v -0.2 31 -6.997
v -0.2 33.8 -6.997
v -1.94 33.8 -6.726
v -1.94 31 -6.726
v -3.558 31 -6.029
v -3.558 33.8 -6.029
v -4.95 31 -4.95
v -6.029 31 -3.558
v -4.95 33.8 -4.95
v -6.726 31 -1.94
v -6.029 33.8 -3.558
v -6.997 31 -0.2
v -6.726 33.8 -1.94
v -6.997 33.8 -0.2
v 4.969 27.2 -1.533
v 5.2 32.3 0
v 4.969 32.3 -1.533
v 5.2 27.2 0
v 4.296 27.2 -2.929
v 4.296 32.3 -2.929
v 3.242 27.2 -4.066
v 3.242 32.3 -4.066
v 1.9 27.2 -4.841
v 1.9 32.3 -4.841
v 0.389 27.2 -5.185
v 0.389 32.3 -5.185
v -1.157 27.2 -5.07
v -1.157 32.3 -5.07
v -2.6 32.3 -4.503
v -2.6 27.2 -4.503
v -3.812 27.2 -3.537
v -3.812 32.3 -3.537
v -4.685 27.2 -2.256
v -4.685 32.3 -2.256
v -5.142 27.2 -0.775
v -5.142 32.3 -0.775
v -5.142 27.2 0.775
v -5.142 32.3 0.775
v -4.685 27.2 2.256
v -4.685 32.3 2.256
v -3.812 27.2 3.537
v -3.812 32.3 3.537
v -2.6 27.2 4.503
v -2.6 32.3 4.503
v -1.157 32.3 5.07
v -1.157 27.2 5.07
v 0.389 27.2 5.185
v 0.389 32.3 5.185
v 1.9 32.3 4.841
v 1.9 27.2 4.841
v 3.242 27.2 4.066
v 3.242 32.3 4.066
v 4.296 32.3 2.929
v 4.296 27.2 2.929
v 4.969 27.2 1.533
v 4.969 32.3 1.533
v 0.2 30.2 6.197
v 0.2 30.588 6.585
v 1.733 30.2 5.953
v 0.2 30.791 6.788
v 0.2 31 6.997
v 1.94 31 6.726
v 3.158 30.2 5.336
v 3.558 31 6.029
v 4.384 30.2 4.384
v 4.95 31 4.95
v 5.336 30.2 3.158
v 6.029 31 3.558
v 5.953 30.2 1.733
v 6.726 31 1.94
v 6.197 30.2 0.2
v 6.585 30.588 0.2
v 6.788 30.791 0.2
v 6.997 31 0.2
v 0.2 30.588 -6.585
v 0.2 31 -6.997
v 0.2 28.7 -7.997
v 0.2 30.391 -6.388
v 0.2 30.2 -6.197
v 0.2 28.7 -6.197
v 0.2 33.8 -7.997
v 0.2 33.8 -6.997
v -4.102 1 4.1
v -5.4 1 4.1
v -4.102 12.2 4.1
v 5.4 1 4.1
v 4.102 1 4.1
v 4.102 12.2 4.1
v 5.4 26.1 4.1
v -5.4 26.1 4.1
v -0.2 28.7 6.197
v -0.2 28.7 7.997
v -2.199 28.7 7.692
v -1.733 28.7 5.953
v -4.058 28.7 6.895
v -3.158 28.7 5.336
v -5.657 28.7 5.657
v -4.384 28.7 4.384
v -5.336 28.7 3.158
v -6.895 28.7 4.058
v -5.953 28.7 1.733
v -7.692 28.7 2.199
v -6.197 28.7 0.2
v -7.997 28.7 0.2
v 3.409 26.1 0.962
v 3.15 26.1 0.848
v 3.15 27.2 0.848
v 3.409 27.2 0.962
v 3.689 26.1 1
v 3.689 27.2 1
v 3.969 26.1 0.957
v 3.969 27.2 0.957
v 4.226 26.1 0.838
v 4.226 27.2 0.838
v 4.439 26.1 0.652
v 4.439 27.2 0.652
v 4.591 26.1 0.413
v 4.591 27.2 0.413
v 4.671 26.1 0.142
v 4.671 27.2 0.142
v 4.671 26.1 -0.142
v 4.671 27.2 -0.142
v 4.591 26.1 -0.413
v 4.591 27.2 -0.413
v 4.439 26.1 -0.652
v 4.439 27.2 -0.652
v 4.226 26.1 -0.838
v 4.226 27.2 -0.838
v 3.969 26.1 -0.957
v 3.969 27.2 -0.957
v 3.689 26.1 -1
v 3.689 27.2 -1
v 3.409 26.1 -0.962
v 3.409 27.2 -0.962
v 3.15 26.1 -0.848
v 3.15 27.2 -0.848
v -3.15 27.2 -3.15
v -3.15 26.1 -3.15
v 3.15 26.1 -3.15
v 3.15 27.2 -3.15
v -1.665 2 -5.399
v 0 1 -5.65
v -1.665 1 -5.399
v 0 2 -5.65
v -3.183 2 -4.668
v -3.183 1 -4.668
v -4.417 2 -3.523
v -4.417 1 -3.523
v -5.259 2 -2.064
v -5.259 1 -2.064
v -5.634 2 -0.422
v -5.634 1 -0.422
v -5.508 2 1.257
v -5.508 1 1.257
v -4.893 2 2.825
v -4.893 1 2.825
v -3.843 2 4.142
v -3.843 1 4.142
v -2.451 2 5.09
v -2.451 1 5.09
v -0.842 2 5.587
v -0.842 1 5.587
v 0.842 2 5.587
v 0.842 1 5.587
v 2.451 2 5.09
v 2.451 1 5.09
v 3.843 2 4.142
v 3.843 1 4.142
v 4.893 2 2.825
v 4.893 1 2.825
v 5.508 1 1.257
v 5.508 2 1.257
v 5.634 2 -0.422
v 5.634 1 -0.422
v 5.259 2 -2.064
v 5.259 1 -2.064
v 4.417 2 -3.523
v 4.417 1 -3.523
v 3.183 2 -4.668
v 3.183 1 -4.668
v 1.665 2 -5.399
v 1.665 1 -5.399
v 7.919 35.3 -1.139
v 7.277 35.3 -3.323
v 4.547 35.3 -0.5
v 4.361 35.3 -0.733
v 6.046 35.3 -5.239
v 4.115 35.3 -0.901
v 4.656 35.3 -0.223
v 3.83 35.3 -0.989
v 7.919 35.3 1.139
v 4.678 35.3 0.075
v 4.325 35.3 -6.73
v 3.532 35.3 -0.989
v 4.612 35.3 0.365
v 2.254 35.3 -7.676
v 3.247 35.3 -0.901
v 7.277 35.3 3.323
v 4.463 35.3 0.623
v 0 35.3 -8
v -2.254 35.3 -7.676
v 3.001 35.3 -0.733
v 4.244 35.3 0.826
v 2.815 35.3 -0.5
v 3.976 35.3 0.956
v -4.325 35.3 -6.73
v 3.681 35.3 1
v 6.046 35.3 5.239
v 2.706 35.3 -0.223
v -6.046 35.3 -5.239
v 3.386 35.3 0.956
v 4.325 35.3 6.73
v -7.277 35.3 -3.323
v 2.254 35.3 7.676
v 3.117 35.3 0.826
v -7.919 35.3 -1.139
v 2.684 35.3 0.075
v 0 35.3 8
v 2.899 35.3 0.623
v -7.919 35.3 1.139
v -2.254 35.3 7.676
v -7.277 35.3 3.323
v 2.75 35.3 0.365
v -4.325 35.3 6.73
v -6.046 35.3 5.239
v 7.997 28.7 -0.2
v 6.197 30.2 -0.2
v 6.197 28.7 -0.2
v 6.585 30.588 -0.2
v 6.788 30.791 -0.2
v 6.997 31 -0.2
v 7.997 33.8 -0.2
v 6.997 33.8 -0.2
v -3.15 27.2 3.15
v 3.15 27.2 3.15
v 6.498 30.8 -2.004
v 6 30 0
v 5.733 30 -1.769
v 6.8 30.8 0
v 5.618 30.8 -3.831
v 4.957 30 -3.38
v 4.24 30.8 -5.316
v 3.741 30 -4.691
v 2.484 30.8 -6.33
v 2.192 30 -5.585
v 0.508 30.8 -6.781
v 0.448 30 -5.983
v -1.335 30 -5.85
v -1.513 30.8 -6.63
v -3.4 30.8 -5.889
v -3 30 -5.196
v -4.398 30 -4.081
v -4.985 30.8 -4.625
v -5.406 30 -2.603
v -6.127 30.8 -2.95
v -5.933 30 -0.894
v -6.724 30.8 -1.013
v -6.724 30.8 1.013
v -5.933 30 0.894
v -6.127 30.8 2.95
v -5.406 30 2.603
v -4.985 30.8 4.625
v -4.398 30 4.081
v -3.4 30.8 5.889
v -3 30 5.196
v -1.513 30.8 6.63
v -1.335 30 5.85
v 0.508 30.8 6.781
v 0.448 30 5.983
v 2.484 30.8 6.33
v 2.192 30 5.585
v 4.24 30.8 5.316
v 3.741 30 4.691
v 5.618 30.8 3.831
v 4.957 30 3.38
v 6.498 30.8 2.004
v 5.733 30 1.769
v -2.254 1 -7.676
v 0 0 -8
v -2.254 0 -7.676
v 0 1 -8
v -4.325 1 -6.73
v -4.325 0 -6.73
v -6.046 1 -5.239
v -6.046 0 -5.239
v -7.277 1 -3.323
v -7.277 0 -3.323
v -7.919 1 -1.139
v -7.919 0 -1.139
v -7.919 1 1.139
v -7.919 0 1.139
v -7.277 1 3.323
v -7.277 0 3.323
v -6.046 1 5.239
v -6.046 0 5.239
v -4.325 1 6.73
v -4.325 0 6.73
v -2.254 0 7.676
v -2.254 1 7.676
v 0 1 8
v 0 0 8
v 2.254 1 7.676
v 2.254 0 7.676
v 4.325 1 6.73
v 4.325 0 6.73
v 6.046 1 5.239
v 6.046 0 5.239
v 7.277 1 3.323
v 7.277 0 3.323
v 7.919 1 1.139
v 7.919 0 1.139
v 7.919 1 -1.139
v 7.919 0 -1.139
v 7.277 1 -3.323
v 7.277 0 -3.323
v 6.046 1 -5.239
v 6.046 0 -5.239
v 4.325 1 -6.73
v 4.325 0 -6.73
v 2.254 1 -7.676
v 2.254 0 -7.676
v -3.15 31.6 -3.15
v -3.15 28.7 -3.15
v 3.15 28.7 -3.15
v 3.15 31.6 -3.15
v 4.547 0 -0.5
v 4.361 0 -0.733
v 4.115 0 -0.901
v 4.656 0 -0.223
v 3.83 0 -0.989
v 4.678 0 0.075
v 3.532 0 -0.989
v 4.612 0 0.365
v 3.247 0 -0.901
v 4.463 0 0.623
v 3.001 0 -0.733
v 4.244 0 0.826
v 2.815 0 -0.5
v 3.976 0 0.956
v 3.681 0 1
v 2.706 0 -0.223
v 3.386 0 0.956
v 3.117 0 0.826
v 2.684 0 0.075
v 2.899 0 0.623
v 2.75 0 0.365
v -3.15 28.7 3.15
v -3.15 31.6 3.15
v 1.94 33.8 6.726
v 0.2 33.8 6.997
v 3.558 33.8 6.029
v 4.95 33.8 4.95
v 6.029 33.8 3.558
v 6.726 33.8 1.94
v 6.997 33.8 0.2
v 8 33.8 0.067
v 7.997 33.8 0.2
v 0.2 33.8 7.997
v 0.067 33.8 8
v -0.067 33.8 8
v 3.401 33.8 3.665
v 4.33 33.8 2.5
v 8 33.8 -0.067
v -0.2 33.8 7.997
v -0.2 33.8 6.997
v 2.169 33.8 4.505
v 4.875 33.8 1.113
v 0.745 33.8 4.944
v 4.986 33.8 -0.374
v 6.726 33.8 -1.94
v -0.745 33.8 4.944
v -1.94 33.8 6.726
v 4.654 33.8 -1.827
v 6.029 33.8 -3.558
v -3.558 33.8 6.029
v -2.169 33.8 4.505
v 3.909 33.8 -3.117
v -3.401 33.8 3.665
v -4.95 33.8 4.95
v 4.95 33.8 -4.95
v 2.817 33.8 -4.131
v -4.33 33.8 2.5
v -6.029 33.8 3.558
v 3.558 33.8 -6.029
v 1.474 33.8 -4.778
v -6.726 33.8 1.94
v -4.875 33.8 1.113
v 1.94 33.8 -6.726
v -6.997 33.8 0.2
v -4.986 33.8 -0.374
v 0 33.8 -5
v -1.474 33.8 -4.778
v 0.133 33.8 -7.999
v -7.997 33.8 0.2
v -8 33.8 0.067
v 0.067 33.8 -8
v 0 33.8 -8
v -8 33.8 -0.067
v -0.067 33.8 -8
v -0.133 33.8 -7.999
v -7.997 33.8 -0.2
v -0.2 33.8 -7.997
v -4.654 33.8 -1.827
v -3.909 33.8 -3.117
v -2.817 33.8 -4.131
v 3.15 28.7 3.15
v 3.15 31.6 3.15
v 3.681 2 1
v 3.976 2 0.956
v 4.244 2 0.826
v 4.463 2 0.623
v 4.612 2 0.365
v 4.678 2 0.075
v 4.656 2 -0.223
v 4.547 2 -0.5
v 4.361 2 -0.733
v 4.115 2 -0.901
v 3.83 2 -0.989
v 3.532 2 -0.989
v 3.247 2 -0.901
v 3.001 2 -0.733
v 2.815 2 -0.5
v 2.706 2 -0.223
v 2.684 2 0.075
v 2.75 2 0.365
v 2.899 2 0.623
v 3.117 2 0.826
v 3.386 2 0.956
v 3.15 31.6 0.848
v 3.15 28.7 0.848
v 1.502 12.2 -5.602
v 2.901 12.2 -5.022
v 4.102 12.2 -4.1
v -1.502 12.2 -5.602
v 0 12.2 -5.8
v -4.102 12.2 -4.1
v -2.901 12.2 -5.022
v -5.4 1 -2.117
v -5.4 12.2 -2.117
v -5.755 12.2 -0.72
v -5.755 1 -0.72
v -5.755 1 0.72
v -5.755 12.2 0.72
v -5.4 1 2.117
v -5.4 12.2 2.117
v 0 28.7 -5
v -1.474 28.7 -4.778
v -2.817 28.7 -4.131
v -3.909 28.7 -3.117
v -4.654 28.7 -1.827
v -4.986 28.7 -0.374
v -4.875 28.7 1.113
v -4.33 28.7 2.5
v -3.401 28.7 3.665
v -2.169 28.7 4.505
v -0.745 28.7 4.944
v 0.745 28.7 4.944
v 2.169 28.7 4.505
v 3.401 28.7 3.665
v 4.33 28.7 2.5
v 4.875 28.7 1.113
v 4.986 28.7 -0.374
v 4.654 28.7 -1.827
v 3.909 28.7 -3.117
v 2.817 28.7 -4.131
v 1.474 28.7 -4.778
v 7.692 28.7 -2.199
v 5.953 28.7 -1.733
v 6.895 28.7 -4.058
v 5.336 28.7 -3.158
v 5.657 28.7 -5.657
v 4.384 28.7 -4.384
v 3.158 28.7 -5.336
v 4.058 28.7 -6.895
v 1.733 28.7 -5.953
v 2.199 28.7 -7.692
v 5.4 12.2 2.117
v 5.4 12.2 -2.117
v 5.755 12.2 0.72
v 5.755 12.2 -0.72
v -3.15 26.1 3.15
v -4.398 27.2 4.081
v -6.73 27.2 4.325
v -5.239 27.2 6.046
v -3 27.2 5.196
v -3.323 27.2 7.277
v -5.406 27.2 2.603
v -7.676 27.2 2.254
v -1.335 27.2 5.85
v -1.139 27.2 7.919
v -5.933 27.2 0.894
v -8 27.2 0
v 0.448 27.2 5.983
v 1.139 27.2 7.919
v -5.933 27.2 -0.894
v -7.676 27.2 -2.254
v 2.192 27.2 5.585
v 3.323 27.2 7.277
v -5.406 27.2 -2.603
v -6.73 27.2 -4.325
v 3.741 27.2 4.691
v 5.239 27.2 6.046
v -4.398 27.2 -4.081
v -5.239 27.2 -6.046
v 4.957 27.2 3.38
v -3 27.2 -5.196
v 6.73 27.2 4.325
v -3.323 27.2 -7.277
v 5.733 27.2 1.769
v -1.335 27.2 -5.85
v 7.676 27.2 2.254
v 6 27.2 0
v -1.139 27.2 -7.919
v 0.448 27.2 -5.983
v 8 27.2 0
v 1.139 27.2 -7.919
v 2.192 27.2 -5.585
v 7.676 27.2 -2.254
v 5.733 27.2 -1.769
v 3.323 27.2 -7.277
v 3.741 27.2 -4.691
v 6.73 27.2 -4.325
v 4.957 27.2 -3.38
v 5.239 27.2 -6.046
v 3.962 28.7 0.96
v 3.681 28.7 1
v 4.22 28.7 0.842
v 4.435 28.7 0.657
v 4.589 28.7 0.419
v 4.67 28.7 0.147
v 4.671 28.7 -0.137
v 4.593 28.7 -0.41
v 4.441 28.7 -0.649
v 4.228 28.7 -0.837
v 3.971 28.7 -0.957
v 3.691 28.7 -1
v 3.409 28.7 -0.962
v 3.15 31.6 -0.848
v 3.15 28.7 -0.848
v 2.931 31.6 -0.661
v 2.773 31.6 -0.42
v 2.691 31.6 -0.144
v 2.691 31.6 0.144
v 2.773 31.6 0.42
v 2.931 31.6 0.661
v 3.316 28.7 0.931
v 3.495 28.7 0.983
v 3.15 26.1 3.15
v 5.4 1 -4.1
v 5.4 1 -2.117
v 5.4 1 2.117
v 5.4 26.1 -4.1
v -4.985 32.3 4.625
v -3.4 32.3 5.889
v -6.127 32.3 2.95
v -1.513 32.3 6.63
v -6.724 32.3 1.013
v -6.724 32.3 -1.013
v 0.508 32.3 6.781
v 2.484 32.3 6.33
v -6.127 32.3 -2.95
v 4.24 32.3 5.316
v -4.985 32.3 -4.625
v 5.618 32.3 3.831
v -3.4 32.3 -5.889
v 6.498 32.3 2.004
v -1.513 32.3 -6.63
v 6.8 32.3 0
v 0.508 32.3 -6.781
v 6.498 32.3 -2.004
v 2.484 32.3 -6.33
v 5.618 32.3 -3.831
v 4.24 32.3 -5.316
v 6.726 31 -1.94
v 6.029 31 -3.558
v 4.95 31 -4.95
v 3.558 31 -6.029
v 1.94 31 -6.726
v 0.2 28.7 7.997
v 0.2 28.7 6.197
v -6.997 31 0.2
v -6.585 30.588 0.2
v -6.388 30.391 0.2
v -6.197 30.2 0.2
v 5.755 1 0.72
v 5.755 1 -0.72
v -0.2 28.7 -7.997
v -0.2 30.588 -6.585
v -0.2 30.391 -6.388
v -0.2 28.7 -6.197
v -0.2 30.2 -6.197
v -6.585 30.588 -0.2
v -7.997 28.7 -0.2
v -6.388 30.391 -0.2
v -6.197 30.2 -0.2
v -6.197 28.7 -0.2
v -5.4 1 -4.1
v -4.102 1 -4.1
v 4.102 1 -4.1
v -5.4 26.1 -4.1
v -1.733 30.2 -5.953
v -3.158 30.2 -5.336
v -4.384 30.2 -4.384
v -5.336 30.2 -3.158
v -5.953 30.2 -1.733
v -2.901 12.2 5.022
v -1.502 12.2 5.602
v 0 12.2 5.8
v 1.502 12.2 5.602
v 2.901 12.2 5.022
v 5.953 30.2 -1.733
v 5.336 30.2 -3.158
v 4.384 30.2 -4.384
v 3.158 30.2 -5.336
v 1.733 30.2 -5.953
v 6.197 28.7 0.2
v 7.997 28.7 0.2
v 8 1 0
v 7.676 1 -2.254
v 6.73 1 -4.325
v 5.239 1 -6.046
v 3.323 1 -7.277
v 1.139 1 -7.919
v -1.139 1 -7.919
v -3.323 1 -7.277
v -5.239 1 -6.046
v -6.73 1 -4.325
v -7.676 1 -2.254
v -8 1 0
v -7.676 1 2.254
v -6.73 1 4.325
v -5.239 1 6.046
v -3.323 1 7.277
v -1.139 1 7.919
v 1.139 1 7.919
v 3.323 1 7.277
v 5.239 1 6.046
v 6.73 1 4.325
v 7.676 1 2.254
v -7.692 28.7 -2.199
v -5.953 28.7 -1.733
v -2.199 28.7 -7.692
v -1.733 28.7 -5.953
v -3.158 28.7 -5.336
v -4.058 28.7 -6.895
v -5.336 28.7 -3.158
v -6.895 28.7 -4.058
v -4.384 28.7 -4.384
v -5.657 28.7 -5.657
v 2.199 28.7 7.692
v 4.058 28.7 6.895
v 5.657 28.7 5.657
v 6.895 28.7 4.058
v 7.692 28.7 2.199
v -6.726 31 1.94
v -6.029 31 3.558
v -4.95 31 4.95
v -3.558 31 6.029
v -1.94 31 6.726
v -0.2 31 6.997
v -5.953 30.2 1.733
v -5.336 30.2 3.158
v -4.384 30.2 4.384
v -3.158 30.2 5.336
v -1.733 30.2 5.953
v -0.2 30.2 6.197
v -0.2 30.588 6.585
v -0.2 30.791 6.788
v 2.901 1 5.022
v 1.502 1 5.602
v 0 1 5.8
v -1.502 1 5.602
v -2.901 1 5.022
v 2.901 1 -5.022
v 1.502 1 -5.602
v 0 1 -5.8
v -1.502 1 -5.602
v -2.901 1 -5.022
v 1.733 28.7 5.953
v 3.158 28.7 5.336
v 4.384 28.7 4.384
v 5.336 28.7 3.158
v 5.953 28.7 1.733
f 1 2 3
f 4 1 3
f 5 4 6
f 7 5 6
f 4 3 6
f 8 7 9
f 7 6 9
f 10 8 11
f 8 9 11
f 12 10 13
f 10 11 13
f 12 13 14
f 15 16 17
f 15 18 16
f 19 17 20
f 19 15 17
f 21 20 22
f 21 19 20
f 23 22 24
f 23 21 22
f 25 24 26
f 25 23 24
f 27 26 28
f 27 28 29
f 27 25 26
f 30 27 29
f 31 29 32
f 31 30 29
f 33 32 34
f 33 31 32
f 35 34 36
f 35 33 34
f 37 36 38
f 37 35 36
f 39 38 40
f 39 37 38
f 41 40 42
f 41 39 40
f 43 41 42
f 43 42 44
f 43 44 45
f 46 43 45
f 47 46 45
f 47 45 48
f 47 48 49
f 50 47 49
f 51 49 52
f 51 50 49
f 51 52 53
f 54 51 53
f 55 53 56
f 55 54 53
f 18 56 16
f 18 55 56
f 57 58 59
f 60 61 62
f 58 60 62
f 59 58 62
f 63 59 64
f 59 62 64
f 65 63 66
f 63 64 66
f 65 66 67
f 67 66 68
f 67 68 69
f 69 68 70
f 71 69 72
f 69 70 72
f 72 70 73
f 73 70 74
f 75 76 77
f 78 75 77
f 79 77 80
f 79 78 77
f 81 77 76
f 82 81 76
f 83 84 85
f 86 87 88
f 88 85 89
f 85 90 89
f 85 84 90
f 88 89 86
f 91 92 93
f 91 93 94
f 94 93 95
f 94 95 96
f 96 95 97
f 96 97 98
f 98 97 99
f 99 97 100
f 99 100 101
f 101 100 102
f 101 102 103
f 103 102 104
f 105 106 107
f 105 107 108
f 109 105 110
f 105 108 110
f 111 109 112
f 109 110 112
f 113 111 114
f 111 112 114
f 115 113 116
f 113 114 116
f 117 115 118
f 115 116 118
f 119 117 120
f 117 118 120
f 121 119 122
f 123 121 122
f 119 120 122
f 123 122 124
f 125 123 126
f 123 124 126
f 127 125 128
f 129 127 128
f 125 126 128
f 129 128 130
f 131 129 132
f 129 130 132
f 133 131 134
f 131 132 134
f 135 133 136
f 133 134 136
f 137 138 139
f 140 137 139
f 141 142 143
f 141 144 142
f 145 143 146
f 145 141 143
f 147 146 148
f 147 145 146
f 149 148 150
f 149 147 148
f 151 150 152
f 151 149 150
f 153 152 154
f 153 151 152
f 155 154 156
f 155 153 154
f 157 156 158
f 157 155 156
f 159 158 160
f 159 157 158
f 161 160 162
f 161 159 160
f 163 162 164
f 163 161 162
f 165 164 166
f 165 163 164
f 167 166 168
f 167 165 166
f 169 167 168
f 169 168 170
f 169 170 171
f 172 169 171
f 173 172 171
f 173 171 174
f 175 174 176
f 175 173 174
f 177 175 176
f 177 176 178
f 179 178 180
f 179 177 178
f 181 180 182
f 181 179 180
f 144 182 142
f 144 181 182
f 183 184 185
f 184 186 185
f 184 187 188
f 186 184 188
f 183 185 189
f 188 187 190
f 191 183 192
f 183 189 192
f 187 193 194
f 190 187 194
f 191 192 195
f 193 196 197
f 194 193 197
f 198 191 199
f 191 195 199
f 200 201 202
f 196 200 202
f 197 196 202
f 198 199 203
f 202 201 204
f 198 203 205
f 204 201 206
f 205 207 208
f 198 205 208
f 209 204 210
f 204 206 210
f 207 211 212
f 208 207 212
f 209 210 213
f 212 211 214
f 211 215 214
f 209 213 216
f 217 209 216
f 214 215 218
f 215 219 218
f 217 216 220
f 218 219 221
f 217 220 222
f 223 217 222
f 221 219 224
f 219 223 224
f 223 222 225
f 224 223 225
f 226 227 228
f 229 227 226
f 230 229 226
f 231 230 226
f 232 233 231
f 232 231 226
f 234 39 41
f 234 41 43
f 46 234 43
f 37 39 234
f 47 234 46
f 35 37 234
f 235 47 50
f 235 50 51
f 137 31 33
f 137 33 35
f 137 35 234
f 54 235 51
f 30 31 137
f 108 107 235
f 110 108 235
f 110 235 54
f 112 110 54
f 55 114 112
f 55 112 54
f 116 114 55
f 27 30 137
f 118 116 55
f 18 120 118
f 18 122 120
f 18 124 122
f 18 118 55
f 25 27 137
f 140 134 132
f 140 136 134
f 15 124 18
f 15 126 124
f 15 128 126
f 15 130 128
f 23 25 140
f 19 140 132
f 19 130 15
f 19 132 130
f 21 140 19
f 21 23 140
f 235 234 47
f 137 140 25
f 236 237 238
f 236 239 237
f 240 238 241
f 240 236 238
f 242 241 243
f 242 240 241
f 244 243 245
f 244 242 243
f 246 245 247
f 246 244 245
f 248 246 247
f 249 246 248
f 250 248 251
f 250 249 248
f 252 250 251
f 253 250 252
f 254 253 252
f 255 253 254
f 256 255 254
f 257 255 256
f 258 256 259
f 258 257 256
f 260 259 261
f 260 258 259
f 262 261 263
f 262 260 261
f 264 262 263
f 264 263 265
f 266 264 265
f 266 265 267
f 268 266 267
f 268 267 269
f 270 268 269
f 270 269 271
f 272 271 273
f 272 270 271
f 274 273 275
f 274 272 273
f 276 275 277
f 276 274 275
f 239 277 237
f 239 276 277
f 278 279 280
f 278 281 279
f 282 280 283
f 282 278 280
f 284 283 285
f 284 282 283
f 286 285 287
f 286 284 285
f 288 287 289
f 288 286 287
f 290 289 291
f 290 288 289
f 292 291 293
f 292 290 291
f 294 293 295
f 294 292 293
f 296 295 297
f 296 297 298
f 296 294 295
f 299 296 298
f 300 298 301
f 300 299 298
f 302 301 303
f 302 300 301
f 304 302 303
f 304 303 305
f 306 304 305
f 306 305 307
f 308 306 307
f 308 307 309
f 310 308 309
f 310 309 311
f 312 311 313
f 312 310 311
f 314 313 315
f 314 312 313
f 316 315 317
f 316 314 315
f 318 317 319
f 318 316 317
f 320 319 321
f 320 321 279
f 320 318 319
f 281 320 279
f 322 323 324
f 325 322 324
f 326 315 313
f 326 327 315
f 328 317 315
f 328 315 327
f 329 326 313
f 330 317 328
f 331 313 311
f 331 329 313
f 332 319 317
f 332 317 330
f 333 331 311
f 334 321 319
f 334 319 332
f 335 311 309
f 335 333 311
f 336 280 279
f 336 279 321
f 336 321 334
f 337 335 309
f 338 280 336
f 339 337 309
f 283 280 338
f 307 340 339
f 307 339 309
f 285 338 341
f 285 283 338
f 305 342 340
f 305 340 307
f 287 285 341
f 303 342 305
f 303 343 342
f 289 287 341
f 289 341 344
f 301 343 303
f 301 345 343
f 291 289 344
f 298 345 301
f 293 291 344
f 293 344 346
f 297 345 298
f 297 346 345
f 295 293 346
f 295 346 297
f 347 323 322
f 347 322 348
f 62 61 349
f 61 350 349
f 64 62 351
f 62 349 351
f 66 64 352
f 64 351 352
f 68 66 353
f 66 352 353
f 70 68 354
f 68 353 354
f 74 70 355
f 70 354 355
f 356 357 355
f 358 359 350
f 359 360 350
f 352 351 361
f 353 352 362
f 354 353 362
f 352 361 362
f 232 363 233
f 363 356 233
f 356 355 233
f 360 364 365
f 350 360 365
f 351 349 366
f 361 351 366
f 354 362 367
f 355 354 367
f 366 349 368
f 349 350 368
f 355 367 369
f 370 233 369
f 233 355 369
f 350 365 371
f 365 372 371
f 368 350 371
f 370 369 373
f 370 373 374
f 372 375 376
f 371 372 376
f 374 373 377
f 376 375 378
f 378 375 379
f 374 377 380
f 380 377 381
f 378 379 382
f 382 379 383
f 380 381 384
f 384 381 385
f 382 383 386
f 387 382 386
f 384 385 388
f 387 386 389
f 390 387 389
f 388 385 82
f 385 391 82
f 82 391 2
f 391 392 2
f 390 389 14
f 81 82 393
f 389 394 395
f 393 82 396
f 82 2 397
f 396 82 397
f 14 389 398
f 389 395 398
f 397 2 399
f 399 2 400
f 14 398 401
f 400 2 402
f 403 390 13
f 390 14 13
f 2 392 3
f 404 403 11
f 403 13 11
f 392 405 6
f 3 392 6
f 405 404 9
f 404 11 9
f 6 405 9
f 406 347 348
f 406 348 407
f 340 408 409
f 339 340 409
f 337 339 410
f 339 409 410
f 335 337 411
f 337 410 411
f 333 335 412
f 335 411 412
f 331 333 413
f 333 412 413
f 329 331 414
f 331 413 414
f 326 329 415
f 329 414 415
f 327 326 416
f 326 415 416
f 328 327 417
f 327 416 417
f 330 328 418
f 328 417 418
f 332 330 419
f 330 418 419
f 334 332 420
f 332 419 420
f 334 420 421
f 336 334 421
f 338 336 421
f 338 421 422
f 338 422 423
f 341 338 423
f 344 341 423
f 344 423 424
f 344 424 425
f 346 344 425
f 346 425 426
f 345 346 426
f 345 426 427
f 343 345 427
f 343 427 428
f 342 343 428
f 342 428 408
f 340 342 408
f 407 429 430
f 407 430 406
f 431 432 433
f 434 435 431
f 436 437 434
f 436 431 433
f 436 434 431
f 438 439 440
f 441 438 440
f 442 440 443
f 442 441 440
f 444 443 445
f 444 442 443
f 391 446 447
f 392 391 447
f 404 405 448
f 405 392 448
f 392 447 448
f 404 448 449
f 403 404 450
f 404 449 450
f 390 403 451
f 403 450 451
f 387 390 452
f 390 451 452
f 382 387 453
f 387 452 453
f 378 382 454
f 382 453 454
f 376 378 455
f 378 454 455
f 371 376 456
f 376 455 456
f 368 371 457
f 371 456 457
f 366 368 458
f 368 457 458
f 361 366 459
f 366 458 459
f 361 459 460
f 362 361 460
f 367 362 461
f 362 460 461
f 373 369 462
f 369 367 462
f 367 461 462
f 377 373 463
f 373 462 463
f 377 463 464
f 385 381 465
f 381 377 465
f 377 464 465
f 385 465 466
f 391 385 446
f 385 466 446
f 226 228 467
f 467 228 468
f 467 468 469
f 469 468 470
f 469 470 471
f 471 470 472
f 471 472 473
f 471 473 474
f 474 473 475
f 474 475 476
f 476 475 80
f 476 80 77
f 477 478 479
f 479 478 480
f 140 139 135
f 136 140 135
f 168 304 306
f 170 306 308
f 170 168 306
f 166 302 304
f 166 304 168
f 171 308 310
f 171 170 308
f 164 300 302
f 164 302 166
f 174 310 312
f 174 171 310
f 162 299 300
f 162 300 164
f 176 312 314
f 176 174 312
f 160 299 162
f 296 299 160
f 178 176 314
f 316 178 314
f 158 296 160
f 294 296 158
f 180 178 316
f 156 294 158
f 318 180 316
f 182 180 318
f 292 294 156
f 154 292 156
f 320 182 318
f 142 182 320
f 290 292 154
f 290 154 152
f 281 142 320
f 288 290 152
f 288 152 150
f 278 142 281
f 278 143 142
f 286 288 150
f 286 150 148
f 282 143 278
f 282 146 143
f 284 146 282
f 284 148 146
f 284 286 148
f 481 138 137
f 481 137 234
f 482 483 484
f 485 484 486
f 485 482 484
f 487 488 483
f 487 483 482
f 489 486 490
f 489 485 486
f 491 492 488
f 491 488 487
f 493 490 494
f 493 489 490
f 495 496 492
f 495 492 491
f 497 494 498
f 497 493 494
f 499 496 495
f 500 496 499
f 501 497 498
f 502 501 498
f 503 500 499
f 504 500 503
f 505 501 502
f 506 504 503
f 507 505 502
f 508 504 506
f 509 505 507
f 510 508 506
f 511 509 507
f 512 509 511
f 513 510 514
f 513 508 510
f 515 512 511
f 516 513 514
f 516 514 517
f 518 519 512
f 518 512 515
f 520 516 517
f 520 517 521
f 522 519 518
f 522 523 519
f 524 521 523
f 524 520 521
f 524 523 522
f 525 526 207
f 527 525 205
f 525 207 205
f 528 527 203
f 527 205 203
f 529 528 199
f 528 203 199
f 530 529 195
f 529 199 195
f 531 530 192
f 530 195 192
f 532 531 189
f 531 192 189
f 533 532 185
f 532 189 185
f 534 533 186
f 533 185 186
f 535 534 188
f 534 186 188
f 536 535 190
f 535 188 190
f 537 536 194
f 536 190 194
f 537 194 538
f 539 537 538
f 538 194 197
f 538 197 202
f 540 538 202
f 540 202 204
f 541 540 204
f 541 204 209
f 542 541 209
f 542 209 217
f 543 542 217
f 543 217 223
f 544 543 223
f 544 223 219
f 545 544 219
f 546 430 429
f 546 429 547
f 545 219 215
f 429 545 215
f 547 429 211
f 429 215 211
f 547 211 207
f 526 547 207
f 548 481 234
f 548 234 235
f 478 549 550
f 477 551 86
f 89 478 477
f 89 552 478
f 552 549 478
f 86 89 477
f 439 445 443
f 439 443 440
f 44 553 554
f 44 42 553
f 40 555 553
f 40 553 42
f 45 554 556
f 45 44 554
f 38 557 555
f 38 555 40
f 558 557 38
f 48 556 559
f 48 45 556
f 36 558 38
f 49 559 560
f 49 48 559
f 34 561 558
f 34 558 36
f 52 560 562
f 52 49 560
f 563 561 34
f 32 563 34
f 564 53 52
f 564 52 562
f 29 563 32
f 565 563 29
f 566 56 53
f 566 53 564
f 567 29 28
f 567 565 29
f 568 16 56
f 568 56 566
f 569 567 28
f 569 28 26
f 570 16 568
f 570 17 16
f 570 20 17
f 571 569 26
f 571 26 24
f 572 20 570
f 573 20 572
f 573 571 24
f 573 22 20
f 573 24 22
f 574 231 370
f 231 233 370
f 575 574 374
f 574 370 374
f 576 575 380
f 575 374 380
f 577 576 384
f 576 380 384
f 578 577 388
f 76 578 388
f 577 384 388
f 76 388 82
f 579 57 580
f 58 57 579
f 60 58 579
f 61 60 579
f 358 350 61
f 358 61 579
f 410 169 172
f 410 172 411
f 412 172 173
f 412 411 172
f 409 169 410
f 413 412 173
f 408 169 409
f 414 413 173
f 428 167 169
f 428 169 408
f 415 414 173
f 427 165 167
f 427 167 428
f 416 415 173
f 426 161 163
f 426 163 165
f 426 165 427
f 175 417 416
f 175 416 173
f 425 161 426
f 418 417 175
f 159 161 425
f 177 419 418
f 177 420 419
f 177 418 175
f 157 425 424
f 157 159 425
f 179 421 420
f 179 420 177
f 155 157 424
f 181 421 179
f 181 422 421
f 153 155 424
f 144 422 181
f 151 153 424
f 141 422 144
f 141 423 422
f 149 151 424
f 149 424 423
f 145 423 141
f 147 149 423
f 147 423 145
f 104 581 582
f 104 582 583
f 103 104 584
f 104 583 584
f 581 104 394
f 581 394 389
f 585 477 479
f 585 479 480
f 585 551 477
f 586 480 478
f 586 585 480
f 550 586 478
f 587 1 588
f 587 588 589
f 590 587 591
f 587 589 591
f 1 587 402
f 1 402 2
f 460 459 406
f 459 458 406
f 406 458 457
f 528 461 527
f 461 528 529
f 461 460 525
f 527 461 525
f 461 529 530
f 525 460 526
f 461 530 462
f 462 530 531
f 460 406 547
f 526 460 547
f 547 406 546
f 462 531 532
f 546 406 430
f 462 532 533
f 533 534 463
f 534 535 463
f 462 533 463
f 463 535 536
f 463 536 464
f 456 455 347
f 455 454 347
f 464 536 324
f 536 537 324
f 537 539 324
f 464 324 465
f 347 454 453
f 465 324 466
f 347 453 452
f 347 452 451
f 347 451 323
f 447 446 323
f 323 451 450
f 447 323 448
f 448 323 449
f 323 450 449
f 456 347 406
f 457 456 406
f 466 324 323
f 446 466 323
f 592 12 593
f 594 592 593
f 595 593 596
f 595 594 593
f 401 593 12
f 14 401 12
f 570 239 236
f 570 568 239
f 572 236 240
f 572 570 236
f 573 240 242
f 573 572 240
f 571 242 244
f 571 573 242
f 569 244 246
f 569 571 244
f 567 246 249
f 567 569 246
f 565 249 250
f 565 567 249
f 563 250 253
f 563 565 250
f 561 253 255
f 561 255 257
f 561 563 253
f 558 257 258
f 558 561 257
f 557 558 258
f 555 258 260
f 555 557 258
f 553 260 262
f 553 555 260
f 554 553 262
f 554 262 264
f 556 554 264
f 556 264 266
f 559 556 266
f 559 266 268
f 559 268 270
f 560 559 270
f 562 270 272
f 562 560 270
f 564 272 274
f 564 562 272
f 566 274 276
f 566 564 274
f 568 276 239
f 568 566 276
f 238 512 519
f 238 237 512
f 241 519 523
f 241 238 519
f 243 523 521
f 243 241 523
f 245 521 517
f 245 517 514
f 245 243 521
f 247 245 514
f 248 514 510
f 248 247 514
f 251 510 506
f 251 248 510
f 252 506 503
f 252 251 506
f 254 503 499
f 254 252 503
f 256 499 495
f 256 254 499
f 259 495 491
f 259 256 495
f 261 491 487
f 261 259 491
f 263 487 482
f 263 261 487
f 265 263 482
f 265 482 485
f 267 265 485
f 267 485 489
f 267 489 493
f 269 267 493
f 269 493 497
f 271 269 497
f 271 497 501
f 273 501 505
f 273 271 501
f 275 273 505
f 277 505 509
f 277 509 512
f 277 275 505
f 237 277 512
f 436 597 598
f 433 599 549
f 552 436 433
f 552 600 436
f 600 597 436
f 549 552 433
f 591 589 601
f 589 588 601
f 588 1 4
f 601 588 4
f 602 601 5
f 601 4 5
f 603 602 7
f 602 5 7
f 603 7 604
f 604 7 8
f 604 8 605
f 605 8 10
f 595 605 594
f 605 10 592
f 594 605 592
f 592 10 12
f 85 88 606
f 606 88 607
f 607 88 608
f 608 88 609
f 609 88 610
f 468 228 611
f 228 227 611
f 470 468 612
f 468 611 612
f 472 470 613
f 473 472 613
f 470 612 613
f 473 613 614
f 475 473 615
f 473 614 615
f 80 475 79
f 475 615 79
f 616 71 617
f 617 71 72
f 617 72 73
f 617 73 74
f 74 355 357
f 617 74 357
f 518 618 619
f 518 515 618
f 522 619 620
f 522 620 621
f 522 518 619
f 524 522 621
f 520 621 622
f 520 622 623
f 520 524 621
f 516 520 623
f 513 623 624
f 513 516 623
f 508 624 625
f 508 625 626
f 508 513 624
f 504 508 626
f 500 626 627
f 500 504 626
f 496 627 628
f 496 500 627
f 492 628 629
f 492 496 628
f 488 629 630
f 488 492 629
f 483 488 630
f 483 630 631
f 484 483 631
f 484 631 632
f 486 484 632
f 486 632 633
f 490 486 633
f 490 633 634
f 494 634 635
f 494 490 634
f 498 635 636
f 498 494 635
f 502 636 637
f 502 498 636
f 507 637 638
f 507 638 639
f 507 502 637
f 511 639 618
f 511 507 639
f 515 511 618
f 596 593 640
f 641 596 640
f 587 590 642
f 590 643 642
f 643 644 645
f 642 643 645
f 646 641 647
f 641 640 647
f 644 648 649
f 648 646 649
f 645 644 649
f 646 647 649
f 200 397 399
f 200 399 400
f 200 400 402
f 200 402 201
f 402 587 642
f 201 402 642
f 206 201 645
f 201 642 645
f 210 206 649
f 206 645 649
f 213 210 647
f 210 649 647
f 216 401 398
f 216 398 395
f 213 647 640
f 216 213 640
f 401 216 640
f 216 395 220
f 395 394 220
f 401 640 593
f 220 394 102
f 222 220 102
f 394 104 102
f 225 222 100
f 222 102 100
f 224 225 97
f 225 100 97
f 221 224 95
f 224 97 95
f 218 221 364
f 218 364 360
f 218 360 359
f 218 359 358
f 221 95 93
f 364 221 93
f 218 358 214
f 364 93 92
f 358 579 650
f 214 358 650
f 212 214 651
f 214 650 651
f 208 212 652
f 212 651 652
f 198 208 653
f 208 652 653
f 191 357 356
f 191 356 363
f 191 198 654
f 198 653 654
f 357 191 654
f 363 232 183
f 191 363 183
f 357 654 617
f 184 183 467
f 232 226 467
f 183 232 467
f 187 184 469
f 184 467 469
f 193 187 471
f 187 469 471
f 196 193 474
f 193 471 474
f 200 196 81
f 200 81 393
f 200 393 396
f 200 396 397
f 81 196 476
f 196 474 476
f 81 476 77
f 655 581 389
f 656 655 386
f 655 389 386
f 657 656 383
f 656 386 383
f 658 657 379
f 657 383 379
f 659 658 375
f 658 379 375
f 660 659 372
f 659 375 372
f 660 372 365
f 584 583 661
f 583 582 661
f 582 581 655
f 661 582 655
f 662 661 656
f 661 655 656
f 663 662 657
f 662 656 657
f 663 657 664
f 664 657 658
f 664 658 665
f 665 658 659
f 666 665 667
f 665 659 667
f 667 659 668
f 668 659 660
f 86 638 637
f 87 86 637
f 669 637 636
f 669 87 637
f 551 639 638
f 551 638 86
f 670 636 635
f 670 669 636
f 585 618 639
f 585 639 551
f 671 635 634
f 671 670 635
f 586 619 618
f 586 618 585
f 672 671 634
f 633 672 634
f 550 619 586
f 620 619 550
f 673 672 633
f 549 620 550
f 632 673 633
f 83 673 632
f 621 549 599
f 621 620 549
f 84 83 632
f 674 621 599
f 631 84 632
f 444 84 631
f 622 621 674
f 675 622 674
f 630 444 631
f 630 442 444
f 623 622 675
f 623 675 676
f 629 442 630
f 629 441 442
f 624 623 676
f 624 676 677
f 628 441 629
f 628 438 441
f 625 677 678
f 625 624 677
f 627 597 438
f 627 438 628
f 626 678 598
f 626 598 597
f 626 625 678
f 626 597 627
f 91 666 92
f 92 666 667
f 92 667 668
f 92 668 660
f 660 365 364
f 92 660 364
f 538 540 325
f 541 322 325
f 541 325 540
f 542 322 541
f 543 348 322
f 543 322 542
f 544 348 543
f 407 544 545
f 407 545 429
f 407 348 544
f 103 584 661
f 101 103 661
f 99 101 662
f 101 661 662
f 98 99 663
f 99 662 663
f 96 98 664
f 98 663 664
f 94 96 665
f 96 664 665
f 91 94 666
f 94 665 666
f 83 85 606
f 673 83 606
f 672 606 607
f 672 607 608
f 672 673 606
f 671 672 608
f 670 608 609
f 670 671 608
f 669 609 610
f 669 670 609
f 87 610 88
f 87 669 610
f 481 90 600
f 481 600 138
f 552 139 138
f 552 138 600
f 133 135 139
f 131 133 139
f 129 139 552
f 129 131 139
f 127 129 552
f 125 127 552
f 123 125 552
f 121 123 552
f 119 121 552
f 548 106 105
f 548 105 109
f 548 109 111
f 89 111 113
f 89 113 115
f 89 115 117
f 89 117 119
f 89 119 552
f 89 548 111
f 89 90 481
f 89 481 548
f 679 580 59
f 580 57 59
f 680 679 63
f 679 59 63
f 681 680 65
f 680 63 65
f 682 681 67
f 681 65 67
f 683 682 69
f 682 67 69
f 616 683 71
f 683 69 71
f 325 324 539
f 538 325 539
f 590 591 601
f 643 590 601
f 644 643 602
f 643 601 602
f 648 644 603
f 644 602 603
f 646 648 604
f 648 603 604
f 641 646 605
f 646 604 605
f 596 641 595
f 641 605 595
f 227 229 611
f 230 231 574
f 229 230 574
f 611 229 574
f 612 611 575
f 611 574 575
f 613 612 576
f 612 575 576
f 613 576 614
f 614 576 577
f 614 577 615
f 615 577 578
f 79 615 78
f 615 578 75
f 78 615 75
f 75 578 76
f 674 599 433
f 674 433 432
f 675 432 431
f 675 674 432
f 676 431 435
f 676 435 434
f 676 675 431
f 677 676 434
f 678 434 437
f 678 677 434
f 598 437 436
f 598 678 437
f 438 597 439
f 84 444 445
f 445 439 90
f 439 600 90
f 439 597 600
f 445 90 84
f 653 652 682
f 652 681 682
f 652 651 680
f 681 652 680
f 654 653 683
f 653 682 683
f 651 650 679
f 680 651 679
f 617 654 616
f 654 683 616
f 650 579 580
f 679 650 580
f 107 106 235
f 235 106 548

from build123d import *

# Parameters (mm, degrees)
CUT_EXTRUDE1_START      = -13.9
SKETCH2_W               = 10.8
SKETCH2_H               = 8.2
CUT_EXTRUDE1_DEPTH      = 40.621780654
CUT_EXTRUDE3_START      = -13.9
SKETCH2_3_W             = 6.3
SKETCH2_3_H             = 6.3
CUT_EXTRUDE3_DEPTH      = 5.5
SKETCH3_R               = 1
CUT_EXTRUDE4_DEPTH      = 38.068719967
CUT_EXTRUDE_THIN1_START = -5.1
SKETCH4_W               = 0.4
SKETCH4_H               = 5.00808145
SKETCH4_W_2             = 10.887021878
SKETCH4_H_2             = 0.4
SKETCH4_W_3             = 16.876138358
SKETCH4_H_3             = 7.865270954
CUT_EXTRUDE_THIN1_DEPTH = 33.8


# Read off the part's stored shape, not the designer's step: Revolve2
with BuildPart() as part:
    # Sketch1 → Revolve1 (revolve)
    with BuildSketch(Plane.XY, mode=Mode.PRIVATE) as revolve1_sk:
        Polygon((-5, 28.7), (0, 28.7), (0, 35.3), (-8, 35.3), (-8, 28.7), (-6.2, 28.7), (-6.2, 30.2), (-7, 31), (-7, 33.8), (-5, 33.8), align=None)
    revolve(revolve1_sk.sketch.rotate(Axis((0, 0, 0), (0, 1, 0)), 270), axis=Axis((0, 0, 0), (0, 1, 0)))


with BuildPart() as body_2:
    # Revolve2 outline → Revolve2 (revolve)
    with BuildSketch(Plane.XY):
        Polygon((8, 27.2), (6, 27.2), (6, 30), (6.8, 30.8), (6.8, 32.3), (5.2, 32.3), (5.2, 27.2), (0, 27.2), (0, 12.2), (5.8, 12.2), (5.8, 1), (8, 1), align=None)
    revolve(axis=Axis((0, 0, 0), (0, 1, 0)))

    # Sketch2 → Cut-Extrude1 (cut, through all)
    with BuildSketch(Plane.XZ.offset(-12.2).offset(CUT_EXTRUDE1_START)):
        Rectangle(SKETCH2_W, SKETCH2_H)
    extrude(amount=CUT_EXTRUDE1_DEPTH, mode=Mode.SUBTRACT)


with BuildPart() as body_3:
    # Sketch1<4> → Revolve3 (revolve)
    with BuildSketch(Plane.XY, mode=Mode.PRIVATE) as revolve3_sk:
        Polygon((-8, 1), (-5.65, 1), (-5.65, 2), (0, 2), (0, 0), (-8, 0), align=None)
    revolve(revolve3_sk.sketch.rotate(Axis((0, 0, 0), (0, 1, 0)), 270), axis=Axis((0, 0, 0), (0, 1, 0)))


with BuildPart() as cut_extrude3_tool:
    # Sketch2<3> → Cut-Extrude3 (new body)
    with BuildSketch(Plane.XZ.offset(-12.2).offset(CUT_EXTRUDE3_START)):
        Rectangle(SKETCH2_3_W, SKETCH2_3_H)
    extrude(amount=-CUT_EXTRUDE3_DEPTH)


with BuildPart() as part_1:
    add(part.part)

    # Cut-Extrude3: cut by cut_extrude3_tool
    add(cut_extrude3_tool.part, mode=Mode.SUBTRACT)


with BuildPart() as body_2_1:
    add(body_2.part)

    # Cut-Extrude3: cut by cut_extrude3_tool
    add(cut_extrude3_tool.part, mode=Mode.SUBTRACT)


with BuildPart() as cut_extrude4_tool:
    # Sketch3 → Cut-Extrude4 (new, through all)
    with BuildSketch(Plane(origin=(0, 35.3, 0), x_dir=(1, 0, 0), z_dir=(0, 1, 0))):
        with Locations(Location((3.68076211, 0, 0), (0, 0, 270))):
            Circle(SKETCH3_R)
    extrude(amount=-CUT_EXTRUDE4_DEPTH)


with BuildPart() as part_2:
    add(part_1.part)

    # Cut-Extrude4: cut by cut_extrude4_tool
    add(cut_extrude4_tool.part, mode=Mode.SUBTRACT)

    # Sketch4 → Cut-Extrude-Thin1 (cut)
    with BuildSketch(Plane.XZ.offset(-28.7).offset(CUT_EXTRUDE_THIN1_START)):
        with Locations((0, 7.504040725)):
            Rectangle(SKETCH4_W, SKETCH4_H)
        with Locations((-10.443510939, 0)):
            Rectangle(SKETCH4_W_2, SKETCH4_H_2)
        with Locations((13.438069179, 0)):
            Rectangle(SKETCH4_W_3, SKETCH4_H_2)
        with Locations((0, -8.932635477)):
            Rectangle(SKETCH4_W, SKETCH4_H_3)
    extrude(amount=CUT_EXTRUDE_THIN1_DEPTH, mode=Mode.SUBTRACT)


with BuildPart() as body_2_2:
    add(body_2_1.part)

    # Cut-Extrude4: cut by cut_extrude4_tool
    add(cut_extrude4_tool.part, mode=Mode.SUBTRACT)


with BuildPart() as body_3_1:
    add(body_3.part)

    # Cut-Extrude4: cut by cut_extrude4_tool
    add(cut_extrude4_tool.part, mode=Mode.SUBTRACT)


solid = Compound([part_2.part, body_2_2.part, body_3_1.part])
